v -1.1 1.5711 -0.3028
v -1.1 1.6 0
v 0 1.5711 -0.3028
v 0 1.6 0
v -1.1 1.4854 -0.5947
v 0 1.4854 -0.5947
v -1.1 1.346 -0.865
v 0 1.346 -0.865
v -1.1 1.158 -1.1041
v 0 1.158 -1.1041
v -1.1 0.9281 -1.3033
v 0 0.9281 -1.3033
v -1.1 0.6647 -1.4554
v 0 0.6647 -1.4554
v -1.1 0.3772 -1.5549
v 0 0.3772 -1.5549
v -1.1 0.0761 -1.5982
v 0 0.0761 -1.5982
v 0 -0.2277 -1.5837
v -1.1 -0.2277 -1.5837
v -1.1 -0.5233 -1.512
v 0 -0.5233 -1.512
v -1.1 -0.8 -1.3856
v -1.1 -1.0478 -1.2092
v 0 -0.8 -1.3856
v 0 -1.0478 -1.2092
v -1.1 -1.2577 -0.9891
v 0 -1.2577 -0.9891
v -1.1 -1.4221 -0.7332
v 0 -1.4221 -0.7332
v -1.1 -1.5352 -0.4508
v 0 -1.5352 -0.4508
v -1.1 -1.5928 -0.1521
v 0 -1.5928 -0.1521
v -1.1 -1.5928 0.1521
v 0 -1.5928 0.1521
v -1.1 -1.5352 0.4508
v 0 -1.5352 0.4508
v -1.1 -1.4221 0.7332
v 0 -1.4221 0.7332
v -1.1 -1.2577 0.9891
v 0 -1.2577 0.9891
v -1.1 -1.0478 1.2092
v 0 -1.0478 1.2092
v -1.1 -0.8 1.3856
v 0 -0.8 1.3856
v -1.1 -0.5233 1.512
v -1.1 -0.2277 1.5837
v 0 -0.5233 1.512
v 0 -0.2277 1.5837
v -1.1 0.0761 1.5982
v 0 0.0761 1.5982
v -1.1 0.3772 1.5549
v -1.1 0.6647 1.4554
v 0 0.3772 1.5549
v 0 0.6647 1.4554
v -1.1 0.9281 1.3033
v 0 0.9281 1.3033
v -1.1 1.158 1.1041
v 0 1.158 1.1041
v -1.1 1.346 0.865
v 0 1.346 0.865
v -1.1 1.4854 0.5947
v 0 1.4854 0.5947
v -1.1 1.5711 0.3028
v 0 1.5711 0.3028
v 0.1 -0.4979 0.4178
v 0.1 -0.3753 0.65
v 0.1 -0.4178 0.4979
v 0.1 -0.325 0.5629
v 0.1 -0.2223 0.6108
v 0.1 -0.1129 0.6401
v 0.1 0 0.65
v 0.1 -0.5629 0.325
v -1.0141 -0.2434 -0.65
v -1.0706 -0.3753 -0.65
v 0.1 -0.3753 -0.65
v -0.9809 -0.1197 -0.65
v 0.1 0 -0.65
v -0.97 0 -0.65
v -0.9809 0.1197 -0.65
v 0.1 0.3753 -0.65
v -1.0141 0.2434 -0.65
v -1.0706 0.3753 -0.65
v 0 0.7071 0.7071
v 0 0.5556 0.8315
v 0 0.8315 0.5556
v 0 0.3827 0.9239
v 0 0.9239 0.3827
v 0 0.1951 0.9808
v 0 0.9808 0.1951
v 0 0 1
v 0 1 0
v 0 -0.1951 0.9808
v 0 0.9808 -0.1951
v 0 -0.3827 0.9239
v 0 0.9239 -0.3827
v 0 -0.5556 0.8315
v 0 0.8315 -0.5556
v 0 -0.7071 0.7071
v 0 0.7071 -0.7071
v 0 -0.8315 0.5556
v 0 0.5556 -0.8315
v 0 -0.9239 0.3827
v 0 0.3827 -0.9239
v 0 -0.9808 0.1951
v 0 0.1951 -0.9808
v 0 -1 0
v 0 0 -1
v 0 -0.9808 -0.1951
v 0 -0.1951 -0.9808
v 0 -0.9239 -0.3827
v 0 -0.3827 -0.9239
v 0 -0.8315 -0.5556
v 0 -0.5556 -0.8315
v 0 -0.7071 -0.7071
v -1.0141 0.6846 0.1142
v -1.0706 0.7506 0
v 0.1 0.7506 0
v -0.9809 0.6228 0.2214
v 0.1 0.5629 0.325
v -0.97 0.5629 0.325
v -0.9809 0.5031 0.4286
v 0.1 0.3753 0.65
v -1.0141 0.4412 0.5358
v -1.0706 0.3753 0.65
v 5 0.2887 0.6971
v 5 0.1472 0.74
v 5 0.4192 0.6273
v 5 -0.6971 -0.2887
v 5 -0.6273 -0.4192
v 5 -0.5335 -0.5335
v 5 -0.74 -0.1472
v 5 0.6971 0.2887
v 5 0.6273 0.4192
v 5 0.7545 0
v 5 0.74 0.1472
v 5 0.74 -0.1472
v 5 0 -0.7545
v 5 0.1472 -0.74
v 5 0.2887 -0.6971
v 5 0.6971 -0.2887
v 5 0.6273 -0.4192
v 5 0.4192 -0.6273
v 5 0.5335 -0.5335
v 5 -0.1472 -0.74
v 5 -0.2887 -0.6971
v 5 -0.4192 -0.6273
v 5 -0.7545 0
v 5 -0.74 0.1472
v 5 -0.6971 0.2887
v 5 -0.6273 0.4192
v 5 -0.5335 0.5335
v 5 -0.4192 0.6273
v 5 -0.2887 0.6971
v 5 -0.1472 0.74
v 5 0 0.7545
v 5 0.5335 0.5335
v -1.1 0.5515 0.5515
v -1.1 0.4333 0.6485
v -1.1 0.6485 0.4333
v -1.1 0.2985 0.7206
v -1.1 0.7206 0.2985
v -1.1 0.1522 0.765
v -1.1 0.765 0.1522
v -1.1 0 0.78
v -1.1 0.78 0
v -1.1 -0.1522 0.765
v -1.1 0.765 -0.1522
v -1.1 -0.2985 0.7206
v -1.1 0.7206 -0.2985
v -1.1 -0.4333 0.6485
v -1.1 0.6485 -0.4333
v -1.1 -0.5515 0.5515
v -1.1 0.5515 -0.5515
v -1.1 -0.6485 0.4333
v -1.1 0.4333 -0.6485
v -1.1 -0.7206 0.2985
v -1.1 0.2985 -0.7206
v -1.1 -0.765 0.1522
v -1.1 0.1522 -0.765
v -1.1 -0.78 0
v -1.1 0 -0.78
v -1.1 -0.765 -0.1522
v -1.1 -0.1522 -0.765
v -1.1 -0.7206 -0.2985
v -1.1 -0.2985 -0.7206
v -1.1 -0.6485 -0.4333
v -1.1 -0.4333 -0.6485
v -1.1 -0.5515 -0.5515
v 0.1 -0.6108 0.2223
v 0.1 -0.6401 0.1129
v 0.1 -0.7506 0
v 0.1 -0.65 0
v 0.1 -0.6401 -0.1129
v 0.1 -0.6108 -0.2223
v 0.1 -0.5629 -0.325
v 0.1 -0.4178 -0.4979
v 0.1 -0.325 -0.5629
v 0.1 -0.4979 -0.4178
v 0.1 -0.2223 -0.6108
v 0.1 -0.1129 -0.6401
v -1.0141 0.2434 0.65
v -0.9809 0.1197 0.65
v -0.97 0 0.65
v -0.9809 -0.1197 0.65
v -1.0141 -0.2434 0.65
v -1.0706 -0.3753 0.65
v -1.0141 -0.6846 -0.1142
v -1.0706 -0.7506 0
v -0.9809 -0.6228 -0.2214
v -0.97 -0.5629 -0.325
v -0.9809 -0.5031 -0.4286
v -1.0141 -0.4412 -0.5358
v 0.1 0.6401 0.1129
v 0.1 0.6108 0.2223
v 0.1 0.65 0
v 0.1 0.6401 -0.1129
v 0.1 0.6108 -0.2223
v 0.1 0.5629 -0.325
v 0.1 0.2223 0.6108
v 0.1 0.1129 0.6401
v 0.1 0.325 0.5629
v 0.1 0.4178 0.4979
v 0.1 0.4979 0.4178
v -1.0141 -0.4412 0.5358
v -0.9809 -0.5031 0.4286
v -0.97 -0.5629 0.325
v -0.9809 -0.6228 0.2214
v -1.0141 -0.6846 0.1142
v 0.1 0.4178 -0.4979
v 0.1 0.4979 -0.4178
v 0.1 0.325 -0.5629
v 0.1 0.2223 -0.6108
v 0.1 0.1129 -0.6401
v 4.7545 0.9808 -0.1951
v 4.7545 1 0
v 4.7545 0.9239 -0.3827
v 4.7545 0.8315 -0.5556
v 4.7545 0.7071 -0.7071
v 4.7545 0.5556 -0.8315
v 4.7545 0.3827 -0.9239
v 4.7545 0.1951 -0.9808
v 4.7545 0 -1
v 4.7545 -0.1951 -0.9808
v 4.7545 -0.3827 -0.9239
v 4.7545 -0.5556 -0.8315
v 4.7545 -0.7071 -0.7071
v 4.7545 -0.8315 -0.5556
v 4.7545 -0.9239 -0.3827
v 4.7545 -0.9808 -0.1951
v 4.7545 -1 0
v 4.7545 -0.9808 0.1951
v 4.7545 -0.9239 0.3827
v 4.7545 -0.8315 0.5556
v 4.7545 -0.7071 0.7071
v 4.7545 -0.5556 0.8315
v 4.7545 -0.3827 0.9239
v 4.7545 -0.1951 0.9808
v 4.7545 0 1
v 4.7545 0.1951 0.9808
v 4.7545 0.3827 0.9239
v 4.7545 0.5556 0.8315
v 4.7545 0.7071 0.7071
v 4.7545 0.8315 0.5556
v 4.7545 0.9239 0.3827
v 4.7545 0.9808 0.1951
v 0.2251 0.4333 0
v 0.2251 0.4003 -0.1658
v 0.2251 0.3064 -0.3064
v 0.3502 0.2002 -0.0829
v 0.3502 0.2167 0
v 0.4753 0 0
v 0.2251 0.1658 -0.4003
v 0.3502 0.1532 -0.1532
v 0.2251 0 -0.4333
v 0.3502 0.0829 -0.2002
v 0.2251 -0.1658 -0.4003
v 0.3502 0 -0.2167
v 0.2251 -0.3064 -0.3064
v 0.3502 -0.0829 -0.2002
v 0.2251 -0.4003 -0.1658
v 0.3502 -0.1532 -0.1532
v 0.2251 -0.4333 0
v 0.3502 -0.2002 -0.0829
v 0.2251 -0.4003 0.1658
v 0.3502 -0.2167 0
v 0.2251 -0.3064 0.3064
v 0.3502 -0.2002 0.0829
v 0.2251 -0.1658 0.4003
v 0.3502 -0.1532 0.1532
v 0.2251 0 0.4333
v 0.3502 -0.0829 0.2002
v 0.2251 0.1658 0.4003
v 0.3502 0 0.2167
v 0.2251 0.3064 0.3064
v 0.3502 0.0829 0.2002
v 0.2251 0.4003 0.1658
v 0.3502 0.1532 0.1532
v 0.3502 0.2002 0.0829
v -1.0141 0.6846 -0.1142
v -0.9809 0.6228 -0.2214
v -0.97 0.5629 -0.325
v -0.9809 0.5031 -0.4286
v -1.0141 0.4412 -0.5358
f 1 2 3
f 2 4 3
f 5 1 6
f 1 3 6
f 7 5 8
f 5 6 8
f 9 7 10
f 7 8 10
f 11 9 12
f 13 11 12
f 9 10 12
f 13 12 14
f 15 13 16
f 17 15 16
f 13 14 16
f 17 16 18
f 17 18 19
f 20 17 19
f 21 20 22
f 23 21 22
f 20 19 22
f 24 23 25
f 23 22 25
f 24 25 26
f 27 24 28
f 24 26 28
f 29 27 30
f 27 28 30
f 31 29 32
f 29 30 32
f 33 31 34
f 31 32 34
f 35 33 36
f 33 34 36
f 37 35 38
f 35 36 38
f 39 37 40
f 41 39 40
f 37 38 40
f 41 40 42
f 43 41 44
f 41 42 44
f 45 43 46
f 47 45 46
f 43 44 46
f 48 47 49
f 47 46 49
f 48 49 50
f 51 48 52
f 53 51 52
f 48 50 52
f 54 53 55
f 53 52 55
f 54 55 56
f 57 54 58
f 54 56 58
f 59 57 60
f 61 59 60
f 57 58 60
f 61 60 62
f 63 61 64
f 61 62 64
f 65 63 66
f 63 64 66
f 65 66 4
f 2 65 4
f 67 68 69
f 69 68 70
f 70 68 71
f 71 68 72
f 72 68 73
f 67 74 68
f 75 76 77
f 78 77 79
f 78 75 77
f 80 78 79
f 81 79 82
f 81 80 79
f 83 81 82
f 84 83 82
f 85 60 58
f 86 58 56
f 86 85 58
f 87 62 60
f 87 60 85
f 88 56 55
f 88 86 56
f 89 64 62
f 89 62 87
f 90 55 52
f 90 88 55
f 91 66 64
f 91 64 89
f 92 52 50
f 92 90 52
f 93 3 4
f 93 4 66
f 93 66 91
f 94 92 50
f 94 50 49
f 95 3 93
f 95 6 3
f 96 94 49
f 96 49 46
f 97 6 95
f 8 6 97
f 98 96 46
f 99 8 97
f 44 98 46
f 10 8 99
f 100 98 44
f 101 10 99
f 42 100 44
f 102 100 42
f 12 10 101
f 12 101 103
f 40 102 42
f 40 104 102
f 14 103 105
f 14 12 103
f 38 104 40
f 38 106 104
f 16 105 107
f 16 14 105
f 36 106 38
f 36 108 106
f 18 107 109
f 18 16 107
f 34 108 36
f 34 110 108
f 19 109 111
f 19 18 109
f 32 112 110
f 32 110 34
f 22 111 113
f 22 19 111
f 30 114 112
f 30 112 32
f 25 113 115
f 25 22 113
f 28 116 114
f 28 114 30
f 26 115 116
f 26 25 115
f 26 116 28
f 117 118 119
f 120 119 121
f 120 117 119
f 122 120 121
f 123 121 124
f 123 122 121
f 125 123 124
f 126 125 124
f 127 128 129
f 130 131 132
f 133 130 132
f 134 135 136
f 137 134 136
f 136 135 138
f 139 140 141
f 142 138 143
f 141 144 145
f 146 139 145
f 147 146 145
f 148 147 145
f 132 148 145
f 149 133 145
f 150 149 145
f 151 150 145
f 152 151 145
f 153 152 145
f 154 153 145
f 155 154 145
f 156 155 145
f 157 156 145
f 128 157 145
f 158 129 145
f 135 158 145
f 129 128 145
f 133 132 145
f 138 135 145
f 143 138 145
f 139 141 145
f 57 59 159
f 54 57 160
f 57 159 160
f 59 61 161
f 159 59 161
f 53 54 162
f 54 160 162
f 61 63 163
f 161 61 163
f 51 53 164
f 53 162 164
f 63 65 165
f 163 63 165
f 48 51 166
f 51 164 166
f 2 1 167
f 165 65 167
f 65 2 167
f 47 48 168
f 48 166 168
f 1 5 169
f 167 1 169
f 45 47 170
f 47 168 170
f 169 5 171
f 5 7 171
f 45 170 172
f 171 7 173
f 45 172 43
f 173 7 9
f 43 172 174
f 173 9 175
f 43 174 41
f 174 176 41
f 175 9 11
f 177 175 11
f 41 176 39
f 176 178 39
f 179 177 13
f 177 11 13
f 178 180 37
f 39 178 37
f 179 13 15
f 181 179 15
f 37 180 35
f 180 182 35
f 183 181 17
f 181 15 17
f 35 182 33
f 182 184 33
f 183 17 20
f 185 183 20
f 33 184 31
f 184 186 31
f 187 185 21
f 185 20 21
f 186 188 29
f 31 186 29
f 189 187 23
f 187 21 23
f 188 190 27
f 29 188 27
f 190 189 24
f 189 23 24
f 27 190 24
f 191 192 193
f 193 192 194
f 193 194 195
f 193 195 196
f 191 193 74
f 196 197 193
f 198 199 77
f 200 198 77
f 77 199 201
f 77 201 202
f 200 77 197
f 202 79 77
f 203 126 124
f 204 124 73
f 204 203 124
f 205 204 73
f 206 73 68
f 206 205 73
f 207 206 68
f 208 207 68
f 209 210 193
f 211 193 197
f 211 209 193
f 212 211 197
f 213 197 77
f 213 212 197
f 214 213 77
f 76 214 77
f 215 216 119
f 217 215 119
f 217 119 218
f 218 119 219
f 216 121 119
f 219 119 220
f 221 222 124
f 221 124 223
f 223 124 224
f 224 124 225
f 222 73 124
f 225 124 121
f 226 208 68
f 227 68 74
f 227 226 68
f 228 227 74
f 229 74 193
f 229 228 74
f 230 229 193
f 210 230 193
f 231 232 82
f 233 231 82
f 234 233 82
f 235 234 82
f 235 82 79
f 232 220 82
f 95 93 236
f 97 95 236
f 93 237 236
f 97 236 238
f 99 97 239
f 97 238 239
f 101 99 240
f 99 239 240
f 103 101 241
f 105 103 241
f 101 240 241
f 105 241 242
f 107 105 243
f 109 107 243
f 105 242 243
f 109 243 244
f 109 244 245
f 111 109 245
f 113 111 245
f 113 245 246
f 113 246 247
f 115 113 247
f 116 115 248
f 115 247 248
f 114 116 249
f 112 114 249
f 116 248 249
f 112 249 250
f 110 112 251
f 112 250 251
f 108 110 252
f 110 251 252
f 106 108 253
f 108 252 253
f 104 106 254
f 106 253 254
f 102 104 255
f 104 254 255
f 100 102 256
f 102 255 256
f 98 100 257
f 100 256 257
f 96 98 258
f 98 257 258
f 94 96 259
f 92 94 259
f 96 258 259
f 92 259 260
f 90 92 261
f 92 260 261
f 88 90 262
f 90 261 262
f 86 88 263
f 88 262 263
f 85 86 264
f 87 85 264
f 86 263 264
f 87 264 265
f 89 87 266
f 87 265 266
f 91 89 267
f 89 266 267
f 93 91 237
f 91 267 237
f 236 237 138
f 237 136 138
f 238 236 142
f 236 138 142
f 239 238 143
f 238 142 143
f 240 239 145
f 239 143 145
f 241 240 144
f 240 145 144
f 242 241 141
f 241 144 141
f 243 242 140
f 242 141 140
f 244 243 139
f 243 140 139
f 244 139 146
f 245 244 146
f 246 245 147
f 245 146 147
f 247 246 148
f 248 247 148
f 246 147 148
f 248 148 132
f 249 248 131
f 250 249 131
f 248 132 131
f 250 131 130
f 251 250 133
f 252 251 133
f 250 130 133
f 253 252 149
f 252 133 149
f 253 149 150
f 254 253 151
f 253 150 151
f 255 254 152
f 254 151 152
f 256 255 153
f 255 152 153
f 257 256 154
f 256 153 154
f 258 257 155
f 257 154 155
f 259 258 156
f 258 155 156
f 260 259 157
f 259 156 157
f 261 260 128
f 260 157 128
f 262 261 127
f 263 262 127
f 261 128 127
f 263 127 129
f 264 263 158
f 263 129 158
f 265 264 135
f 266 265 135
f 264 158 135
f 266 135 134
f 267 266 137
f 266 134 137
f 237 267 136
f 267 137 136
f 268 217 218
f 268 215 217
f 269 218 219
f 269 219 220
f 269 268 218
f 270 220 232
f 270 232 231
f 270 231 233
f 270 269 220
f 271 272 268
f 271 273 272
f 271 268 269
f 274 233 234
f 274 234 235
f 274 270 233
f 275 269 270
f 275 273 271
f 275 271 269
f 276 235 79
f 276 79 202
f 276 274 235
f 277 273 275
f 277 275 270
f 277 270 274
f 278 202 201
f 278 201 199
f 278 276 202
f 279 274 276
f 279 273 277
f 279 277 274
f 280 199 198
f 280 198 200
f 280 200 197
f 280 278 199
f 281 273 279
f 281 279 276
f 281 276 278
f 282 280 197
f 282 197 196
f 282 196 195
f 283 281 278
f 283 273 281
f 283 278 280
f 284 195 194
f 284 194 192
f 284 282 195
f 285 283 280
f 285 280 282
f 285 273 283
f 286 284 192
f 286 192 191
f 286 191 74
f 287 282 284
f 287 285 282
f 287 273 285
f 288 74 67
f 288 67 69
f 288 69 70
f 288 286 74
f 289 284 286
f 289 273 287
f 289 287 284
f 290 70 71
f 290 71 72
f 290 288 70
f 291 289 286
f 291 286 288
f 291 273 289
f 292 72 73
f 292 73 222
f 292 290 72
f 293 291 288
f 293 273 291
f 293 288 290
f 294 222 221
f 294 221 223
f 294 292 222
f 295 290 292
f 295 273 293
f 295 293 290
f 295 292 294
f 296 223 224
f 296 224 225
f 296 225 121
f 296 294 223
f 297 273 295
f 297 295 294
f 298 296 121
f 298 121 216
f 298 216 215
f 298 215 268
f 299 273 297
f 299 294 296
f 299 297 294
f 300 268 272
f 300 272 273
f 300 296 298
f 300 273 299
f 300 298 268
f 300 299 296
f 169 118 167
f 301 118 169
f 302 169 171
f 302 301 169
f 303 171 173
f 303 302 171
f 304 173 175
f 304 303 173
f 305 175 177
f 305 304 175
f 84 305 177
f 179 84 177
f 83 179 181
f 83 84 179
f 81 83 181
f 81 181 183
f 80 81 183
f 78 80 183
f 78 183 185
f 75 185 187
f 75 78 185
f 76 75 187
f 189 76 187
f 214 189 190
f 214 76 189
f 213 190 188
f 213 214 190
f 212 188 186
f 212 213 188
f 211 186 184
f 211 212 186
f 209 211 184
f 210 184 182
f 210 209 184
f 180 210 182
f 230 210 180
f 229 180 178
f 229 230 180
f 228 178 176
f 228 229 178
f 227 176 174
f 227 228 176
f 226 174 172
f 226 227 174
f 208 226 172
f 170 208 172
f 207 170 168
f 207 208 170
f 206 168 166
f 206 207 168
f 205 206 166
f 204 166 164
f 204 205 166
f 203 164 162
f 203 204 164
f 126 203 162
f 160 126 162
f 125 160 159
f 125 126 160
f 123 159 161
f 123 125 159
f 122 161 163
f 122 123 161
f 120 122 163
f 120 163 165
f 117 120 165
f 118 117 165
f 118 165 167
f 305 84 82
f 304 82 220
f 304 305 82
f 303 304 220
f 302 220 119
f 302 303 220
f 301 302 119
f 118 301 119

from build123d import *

# Parameters (mm, degrees)
SKETCH2_W          = 1.1
SKETCH2_H          = 1.6
CUT_EXTRUDE1_DEPTH = 1.2


with BuildPart() as part:
    # Sketch1 → Revolve1 (revolve)
    with BuildSketch(Plane.XY):
        Polygon((0, 0), (0, 1), (4.7545, 1), (5, 0.7545), (5, 0), align=None)
    revolve(axis=Axis((5, 0, 0), (-1, 0, 0)))

    # Sketch2 → Revolve2 (revolve)
    with BuildSketch(Plane.XY):
        with Locations((-0.55, 0.8)):
            Rectangle(SKETCH2_W, SKETCH2_H)
    revolve(axis=Axis((0, 0, 0), (-1, 0, 0)))

    # Sketch3 → Cut-Revolve1 (revolve, cut)
    with BuildSketch(Plane.XY):
        Polygon((-1.1, 0), (-1.1, 0.78), (-0.97, 0.65), (0.1, 0.65), (0.475277675, 0), align=None)
    revolve(axis=Axis((0.475277675, 0, 0), (-1, 0, 0)), mode=Mode.SUBTRACT)

    # Sketch4 → Cut-Extrude1 (cut)
    with BuildSketch(Plane(origin=(-1.1, 0, 0), x_dir=(0, 0, -1), z_dir=(1, 0, 0))):
        Polygon((-0.65, -0.375277675), (0, -0.75055535), (0.65, -0.375277675), (0.65, 0.375277675), (0, 0.75055535), (-0.65, 0.375277675), align=None)
    extrude(amount=CUT_EXTRUDE1_DEPTH, mode=Mode.SUBTRACT)


solid = part.part
